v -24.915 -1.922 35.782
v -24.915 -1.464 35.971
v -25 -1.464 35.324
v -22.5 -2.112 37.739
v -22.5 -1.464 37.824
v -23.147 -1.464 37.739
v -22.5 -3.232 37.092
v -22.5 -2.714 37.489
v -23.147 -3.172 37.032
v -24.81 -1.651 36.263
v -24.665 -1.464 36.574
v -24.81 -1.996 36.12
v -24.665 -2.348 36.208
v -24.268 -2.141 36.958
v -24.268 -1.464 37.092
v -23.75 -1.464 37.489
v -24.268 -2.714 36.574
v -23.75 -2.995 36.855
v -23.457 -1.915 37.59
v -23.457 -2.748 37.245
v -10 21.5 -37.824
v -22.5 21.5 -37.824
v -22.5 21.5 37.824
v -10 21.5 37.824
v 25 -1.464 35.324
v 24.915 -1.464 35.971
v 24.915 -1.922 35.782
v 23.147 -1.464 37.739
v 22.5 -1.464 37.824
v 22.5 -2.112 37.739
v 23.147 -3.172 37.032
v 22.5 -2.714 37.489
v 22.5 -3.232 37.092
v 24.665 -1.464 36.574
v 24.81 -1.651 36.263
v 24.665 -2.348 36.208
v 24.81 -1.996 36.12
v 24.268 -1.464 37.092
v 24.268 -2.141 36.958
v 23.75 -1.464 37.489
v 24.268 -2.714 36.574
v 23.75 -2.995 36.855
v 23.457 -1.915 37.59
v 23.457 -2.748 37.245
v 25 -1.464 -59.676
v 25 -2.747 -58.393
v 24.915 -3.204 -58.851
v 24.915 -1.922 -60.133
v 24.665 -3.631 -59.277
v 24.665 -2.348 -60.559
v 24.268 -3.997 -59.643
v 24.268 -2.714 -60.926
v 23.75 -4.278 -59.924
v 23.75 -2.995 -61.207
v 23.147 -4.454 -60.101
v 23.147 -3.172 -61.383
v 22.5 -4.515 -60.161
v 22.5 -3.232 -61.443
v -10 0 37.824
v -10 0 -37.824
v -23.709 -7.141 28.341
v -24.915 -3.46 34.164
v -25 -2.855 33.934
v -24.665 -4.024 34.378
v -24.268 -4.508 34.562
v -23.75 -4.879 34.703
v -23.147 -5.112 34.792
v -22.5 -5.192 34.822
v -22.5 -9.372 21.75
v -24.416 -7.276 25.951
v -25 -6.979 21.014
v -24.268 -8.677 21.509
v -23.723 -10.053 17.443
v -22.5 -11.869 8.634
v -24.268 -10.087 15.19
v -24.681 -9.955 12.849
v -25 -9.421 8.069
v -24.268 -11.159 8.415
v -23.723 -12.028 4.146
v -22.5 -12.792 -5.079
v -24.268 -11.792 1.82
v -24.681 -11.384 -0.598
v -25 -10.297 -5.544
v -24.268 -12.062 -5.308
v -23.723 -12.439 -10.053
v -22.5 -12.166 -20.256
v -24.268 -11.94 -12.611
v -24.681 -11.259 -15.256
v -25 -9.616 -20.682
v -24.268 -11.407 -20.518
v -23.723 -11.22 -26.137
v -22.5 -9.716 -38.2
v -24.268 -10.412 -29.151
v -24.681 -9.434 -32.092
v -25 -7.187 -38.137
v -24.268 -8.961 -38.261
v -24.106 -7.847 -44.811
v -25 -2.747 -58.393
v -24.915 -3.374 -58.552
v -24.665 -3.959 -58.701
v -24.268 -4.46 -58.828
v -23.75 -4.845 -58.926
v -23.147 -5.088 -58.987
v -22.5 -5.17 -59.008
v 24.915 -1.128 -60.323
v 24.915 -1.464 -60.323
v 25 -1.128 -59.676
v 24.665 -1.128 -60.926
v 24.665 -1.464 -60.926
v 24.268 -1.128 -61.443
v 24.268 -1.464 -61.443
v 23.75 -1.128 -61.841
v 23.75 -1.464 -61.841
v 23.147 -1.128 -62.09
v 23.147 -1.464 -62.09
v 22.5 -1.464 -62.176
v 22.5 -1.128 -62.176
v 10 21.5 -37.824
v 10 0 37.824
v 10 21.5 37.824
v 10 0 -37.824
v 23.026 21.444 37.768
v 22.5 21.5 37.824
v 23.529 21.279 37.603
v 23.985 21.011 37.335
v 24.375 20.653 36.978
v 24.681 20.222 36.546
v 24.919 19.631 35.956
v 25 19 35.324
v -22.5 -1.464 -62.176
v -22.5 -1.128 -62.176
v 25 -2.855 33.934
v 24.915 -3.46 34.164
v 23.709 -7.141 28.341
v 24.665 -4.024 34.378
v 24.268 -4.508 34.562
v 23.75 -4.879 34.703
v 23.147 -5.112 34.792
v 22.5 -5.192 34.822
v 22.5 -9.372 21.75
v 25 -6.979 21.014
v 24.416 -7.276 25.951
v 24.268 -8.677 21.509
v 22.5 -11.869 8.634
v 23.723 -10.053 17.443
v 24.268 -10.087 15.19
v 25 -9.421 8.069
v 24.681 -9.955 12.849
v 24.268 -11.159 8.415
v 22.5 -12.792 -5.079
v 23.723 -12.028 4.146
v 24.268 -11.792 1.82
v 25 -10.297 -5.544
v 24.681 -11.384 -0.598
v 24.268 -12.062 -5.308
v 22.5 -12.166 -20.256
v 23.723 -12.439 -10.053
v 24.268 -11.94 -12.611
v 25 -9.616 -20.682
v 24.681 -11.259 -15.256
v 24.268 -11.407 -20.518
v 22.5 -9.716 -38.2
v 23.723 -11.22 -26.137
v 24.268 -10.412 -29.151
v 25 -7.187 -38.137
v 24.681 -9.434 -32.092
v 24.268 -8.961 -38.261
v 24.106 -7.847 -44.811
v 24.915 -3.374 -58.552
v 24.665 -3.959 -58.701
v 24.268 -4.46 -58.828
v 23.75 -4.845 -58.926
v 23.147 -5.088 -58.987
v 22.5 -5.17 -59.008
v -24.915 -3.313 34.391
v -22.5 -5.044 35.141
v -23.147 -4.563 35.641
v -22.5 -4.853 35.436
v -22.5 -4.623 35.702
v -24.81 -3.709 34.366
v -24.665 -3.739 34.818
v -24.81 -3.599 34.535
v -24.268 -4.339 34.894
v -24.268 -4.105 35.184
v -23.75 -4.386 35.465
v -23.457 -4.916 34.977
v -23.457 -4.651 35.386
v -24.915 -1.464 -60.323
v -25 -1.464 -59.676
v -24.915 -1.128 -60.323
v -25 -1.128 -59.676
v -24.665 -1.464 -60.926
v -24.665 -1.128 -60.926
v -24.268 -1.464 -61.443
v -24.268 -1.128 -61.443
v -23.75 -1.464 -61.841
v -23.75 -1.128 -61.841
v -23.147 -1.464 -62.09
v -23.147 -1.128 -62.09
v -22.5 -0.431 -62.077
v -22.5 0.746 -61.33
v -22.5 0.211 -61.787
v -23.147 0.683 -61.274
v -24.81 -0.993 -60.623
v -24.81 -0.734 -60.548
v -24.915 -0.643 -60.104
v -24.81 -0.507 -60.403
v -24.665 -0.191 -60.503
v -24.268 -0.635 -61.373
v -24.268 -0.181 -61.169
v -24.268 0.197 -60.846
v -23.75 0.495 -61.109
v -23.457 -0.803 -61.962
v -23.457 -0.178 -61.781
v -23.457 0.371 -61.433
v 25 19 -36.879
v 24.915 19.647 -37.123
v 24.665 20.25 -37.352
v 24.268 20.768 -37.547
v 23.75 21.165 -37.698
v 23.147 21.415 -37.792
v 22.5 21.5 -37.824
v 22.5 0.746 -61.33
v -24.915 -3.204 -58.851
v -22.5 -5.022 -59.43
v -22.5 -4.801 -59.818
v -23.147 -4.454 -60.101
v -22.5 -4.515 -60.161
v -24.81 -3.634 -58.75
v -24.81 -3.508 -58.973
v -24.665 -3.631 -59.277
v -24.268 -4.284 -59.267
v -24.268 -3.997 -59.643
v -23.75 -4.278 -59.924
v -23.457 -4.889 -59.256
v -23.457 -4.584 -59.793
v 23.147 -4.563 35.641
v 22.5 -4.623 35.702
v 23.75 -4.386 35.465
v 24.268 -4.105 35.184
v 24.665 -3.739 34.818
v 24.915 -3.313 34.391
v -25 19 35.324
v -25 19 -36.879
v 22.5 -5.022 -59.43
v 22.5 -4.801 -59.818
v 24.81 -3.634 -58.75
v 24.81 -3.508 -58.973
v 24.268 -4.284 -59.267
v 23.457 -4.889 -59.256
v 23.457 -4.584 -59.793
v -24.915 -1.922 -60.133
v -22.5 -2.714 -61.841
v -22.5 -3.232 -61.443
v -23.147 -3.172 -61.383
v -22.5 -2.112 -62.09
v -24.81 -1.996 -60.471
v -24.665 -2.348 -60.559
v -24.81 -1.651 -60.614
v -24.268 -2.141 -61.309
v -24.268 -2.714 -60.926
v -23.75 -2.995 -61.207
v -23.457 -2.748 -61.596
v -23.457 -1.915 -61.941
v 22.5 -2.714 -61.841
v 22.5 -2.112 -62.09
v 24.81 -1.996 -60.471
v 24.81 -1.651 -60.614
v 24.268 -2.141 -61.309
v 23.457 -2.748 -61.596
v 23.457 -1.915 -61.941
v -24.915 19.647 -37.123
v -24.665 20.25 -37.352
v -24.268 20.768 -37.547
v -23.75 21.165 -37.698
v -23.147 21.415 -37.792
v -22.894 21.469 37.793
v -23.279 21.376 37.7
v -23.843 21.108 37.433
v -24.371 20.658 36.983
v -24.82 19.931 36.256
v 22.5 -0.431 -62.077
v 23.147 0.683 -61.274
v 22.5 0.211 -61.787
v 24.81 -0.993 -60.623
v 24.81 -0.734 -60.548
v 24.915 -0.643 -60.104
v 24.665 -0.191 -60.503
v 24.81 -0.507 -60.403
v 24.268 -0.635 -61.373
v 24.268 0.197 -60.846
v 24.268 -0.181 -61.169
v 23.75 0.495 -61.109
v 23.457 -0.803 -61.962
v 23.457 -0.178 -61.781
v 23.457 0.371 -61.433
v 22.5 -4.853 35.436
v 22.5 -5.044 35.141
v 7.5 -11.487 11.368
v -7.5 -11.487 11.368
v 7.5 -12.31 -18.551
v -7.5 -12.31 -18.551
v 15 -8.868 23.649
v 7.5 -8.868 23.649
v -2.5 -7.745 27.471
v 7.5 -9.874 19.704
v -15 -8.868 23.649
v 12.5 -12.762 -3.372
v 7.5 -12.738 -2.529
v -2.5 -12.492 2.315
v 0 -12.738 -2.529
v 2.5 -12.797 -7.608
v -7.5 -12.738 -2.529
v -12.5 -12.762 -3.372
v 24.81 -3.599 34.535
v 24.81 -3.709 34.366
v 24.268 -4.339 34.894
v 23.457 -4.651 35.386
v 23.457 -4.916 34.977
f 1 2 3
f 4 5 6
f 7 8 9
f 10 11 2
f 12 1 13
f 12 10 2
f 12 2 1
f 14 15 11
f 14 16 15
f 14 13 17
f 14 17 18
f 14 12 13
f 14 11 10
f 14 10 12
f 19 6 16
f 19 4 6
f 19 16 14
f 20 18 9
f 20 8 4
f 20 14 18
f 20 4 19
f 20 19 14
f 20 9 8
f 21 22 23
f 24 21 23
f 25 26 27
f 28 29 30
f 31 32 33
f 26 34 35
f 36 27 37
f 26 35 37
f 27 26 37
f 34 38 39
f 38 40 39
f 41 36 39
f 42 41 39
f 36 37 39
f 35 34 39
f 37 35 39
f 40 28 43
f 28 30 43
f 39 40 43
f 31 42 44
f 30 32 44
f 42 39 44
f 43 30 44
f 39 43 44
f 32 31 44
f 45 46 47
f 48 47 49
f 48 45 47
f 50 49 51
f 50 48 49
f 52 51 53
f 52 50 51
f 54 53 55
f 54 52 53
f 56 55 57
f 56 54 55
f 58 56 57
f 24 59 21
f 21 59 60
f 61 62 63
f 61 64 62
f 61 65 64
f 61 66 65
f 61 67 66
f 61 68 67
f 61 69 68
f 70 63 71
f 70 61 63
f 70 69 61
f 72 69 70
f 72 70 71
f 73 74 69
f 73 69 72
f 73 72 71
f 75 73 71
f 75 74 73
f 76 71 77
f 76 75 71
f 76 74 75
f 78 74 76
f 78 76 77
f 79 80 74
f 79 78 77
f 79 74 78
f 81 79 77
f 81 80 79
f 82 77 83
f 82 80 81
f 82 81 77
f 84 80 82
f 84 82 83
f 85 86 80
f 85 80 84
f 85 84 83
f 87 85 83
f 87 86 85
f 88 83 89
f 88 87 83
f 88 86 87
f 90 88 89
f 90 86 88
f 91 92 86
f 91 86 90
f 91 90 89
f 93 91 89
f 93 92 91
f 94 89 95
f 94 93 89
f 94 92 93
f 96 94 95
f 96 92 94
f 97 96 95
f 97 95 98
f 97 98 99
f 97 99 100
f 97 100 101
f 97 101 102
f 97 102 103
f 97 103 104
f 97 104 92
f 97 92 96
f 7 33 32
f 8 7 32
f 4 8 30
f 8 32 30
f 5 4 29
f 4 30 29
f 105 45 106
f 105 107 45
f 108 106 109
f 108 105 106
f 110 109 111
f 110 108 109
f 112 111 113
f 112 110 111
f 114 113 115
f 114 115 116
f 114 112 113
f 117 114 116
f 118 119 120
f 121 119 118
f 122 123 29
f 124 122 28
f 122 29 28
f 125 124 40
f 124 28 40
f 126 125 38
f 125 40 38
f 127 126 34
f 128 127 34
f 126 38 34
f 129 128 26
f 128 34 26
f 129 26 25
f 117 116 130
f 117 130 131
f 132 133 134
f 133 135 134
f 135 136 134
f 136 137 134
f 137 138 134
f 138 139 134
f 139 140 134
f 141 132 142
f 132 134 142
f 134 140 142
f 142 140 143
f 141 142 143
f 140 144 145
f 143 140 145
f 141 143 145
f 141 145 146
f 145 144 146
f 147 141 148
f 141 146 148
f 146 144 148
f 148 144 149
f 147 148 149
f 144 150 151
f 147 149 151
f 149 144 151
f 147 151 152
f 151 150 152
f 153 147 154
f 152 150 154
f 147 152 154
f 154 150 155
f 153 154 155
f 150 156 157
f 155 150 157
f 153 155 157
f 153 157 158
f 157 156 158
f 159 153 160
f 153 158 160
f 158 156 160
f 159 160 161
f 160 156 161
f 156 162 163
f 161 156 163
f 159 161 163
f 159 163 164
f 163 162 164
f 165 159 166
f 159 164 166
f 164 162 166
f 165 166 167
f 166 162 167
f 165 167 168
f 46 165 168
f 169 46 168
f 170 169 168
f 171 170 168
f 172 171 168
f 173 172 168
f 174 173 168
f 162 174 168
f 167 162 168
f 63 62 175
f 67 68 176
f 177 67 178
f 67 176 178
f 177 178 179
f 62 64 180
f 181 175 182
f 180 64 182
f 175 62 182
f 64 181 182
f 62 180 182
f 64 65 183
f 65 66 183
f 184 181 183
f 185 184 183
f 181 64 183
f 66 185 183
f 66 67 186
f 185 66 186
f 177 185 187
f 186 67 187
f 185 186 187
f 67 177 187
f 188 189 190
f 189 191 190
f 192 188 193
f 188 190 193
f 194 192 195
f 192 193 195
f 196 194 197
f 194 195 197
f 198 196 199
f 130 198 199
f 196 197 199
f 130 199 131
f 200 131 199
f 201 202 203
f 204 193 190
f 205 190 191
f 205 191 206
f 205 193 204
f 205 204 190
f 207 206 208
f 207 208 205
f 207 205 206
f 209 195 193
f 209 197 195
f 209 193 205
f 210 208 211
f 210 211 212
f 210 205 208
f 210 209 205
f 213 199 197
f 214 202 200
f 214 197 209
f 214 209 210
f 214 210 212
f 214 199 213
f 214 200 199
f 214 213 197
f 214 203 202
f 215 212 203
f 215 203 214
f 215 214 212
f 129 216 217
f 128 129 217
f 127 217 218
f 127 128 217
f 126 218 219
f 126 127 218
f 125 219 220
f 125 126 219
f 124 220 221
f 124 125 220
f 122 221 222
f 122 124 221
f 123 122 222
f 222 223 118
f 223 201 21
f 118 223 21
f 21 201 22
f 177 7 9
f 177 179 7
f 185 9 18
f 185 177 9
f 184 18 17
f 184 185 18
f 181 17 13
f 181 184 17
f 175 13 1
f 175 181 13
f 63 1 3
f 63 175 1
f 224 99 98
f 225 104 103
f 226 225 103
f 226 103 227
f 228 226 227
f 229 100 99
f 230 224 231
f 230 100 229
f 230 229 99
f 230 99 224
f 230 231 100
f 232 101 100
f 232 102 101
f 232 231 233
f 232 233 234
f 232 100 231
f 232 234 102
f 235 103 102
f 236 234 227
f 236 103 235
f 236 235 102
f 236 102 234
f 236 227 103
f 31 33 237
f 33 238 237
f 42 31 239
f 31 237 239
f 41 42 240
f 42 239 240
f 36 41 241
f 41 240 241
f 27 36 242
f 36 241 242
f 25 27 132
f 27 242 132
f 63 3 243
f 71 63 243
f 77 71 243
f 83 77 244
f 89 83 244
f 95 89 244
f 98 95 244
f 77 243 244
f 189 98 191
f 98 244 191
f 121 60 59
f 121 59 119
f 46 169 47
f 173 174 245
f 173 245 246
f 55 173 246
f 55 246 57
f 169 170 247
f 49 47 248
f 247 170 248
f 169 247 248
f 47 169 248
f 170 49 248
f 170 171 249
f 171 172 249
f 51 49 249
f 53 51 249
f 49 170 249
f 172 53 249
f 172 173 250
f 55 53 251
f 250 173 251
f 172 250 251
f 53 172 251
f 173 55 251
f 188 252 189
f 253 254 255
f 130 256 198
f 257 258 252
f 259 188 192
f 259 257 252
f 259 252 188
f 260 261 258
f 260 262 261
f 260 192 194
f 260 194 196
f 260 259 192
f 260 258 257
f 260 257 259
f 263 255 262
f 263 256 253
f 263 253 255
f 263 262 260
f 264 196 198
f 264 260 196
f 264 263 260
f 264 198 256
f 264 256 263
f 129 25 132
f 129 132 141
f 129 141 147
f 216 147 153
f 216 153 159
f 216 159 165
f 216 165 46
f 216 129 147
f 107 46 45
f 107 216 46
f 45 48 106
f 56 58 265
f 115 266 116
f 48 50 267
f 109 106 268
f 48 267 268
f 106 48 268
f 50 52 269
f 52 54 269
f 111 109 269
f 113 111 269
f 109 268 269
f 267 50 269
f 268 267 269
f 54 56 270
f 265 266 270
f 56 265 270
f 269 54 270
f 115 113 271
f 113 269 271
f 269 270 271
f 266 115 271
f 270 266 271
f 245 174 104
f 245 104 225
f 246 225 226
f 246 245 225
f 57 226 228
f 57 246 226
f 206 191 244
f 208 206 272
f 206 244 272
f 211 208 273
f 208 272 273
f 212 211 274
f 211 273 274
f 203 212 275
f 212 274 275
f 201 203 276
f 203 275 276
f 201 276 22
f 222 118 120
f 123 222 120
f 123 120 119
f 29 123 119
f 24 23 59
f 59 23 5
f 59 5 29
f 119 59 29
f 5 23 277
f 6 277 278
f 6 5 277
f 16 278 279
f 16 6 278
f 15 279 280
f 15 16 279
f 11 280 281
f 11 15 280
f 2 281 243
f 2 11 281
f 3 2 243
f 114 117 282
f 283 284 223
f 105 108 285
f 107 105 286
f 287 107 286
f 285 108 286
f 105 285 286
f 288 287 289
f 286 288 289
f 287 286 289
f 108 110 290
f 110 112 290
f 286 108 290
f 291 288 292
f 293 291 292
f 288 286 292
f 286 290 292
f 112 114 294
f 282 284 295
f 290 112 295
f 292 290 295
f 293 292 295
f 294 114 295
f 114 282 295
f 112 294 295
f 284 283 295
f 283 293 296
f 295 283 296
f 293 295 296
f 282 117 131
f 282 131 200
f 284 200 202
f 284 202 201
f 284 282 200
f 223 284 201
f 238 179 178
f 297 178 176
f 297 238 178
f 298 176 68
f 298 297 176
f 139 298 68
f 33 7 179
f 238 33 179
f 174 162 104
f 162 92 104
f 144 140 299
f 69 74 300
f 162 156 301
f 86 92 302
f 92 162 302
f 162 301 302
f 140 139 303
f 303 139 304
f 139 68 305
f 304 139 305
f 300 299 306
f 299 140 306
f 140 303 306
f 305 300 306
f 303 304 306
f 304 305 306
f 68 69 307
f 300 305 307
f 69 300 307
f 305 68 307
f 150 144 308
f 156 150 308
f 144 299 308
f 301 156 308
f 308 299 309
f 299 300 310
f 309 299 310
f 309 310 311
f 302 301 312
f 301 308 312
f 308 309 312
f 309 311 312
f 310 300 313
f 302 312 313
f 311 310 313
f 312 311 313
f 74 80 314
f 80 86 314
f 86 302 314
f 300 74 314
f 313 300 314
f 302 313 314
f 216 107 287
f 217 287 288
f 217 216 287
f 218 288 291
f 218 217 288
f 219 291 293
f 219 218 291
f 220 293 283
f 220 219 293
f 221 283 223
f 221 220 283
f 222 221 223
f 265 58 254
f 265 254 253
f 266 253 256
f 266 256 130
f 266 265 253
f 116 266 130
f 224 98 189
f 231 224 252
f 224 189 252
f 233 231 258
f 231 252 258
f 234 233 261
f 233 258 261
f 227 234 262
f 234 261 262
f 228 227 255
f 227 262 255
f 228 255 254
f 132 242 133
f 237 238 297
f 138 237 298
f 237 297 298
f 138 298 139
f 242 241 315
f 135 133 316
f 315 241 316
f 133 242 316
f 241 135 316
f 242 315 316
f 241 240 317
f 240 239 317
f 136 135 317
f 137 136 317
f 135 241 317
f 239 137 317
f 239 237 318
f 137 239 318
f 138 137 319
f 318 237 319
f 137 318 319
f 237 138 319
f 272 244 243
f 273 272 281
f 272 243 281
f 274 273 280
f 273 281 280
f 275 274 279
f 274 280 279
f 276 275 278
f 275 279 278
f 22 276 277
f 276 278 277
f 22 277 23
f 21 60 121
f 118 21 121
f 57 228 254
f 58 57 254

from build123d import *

# Parameters (mm, degrees)
BOSS_EXTRUDE4_DEPTH      = 25
BOSS_EXTRUDE4_DEPTH_BACK = 25
SKETCH4_W                = 20
SKETCH4_H                = 75.64878903
CUT_EXTRUDE1_DEPTH       = 71.37795066
FILLET1_R                = 2.5


with BuildPart() as part:
    # Sketch5 → Boss-Extrude4 (new, two sides: drawn at the far end of the back side and taken through both)
    with BuildSketch(Plane(origin=(0, 0, 0), x_dir=(0, 0, -1), z_dir=(1, 0, 0)).offset(-BOSS_EXTRUDE4_DEPTH_BACK)):
        with BuildLine():
            Line((-37.824394515, 0), (-37.824394515, -2.5))
            Line((-37.824394515, -2.5), (-35.324394515, -5))
            add(Edge.make_bspline(
                [(-35.324394515, -5), (-13.532580845, -13.372844958), (11.79523655, -17.250489512), (59.675605485, -5)],
                knots=[0, 0, 0, 0, 1, 1, 1, 1], degree=3))
            Line((59.675605485, -5), (62.175605485, -2.5))
            Line((62.175605485, -2.5), (62.175605485, 0))
            Line((62.175605485, 0), (37.824394515, 21.5))
            Line((37.824394515, 21.5), (-37.824394515, 21.5))
            Line((-37.824394515, 21.5), (-37.824394515, 0))
        make_face()
    extrude(amount=BOSS_EXTRUDE4_DEPTH + BOSS_EXTRUDE4_DEPTH_BACK)

    # Sketch4 → Cut-Extrude1 (cut, through all)
    with BuildSketch(Plane(origin=(0, 0, 0), x_dir=(1, 0, 0), z_dir=(0, 1, 0))):
        Rectangle(SKETCH4_W, SKETCH4_H)
    extrude(amount=CUT_EXTRUDE1_DEPTH, mode=Mode.SUBTRACT)

    # Fillet1
    fillet1_edges = [part.edges().sort_by_distance(p)[0] for p in [
        (-25, -3.75, 36.574394515),
        (0, 0, -62.175605485),
        (0, -2.5, -62.175605485),
        (12.5, -5, -59.675605485),
        (12.5, -5, 35.324394515),
        (0, -2.5, 37.824394515),
        (-25, -12.695636992, -12.039484877),
        (-25, -3.75, -60.925605485),
        (25, 9.5, 37.824394515),
        (25, -3.75, 36.574394515),
        (25, -12.695636992, -12.039484877),
        (-25, -1.25, -62.175605485),
        (25, -3.75, -60.925605485),
        (25, -1.25, -62.175605485),
        (25, 10.75, -50),
        (25, 21.5, 0),
        (-25, 10.75, -50),
        (-25, 21.5, 0),
        (-25, 9.5, 37.824394515),
    ]]
    fillet(fillet1_edges, radius=FILLET1_R)


solid = part.part
